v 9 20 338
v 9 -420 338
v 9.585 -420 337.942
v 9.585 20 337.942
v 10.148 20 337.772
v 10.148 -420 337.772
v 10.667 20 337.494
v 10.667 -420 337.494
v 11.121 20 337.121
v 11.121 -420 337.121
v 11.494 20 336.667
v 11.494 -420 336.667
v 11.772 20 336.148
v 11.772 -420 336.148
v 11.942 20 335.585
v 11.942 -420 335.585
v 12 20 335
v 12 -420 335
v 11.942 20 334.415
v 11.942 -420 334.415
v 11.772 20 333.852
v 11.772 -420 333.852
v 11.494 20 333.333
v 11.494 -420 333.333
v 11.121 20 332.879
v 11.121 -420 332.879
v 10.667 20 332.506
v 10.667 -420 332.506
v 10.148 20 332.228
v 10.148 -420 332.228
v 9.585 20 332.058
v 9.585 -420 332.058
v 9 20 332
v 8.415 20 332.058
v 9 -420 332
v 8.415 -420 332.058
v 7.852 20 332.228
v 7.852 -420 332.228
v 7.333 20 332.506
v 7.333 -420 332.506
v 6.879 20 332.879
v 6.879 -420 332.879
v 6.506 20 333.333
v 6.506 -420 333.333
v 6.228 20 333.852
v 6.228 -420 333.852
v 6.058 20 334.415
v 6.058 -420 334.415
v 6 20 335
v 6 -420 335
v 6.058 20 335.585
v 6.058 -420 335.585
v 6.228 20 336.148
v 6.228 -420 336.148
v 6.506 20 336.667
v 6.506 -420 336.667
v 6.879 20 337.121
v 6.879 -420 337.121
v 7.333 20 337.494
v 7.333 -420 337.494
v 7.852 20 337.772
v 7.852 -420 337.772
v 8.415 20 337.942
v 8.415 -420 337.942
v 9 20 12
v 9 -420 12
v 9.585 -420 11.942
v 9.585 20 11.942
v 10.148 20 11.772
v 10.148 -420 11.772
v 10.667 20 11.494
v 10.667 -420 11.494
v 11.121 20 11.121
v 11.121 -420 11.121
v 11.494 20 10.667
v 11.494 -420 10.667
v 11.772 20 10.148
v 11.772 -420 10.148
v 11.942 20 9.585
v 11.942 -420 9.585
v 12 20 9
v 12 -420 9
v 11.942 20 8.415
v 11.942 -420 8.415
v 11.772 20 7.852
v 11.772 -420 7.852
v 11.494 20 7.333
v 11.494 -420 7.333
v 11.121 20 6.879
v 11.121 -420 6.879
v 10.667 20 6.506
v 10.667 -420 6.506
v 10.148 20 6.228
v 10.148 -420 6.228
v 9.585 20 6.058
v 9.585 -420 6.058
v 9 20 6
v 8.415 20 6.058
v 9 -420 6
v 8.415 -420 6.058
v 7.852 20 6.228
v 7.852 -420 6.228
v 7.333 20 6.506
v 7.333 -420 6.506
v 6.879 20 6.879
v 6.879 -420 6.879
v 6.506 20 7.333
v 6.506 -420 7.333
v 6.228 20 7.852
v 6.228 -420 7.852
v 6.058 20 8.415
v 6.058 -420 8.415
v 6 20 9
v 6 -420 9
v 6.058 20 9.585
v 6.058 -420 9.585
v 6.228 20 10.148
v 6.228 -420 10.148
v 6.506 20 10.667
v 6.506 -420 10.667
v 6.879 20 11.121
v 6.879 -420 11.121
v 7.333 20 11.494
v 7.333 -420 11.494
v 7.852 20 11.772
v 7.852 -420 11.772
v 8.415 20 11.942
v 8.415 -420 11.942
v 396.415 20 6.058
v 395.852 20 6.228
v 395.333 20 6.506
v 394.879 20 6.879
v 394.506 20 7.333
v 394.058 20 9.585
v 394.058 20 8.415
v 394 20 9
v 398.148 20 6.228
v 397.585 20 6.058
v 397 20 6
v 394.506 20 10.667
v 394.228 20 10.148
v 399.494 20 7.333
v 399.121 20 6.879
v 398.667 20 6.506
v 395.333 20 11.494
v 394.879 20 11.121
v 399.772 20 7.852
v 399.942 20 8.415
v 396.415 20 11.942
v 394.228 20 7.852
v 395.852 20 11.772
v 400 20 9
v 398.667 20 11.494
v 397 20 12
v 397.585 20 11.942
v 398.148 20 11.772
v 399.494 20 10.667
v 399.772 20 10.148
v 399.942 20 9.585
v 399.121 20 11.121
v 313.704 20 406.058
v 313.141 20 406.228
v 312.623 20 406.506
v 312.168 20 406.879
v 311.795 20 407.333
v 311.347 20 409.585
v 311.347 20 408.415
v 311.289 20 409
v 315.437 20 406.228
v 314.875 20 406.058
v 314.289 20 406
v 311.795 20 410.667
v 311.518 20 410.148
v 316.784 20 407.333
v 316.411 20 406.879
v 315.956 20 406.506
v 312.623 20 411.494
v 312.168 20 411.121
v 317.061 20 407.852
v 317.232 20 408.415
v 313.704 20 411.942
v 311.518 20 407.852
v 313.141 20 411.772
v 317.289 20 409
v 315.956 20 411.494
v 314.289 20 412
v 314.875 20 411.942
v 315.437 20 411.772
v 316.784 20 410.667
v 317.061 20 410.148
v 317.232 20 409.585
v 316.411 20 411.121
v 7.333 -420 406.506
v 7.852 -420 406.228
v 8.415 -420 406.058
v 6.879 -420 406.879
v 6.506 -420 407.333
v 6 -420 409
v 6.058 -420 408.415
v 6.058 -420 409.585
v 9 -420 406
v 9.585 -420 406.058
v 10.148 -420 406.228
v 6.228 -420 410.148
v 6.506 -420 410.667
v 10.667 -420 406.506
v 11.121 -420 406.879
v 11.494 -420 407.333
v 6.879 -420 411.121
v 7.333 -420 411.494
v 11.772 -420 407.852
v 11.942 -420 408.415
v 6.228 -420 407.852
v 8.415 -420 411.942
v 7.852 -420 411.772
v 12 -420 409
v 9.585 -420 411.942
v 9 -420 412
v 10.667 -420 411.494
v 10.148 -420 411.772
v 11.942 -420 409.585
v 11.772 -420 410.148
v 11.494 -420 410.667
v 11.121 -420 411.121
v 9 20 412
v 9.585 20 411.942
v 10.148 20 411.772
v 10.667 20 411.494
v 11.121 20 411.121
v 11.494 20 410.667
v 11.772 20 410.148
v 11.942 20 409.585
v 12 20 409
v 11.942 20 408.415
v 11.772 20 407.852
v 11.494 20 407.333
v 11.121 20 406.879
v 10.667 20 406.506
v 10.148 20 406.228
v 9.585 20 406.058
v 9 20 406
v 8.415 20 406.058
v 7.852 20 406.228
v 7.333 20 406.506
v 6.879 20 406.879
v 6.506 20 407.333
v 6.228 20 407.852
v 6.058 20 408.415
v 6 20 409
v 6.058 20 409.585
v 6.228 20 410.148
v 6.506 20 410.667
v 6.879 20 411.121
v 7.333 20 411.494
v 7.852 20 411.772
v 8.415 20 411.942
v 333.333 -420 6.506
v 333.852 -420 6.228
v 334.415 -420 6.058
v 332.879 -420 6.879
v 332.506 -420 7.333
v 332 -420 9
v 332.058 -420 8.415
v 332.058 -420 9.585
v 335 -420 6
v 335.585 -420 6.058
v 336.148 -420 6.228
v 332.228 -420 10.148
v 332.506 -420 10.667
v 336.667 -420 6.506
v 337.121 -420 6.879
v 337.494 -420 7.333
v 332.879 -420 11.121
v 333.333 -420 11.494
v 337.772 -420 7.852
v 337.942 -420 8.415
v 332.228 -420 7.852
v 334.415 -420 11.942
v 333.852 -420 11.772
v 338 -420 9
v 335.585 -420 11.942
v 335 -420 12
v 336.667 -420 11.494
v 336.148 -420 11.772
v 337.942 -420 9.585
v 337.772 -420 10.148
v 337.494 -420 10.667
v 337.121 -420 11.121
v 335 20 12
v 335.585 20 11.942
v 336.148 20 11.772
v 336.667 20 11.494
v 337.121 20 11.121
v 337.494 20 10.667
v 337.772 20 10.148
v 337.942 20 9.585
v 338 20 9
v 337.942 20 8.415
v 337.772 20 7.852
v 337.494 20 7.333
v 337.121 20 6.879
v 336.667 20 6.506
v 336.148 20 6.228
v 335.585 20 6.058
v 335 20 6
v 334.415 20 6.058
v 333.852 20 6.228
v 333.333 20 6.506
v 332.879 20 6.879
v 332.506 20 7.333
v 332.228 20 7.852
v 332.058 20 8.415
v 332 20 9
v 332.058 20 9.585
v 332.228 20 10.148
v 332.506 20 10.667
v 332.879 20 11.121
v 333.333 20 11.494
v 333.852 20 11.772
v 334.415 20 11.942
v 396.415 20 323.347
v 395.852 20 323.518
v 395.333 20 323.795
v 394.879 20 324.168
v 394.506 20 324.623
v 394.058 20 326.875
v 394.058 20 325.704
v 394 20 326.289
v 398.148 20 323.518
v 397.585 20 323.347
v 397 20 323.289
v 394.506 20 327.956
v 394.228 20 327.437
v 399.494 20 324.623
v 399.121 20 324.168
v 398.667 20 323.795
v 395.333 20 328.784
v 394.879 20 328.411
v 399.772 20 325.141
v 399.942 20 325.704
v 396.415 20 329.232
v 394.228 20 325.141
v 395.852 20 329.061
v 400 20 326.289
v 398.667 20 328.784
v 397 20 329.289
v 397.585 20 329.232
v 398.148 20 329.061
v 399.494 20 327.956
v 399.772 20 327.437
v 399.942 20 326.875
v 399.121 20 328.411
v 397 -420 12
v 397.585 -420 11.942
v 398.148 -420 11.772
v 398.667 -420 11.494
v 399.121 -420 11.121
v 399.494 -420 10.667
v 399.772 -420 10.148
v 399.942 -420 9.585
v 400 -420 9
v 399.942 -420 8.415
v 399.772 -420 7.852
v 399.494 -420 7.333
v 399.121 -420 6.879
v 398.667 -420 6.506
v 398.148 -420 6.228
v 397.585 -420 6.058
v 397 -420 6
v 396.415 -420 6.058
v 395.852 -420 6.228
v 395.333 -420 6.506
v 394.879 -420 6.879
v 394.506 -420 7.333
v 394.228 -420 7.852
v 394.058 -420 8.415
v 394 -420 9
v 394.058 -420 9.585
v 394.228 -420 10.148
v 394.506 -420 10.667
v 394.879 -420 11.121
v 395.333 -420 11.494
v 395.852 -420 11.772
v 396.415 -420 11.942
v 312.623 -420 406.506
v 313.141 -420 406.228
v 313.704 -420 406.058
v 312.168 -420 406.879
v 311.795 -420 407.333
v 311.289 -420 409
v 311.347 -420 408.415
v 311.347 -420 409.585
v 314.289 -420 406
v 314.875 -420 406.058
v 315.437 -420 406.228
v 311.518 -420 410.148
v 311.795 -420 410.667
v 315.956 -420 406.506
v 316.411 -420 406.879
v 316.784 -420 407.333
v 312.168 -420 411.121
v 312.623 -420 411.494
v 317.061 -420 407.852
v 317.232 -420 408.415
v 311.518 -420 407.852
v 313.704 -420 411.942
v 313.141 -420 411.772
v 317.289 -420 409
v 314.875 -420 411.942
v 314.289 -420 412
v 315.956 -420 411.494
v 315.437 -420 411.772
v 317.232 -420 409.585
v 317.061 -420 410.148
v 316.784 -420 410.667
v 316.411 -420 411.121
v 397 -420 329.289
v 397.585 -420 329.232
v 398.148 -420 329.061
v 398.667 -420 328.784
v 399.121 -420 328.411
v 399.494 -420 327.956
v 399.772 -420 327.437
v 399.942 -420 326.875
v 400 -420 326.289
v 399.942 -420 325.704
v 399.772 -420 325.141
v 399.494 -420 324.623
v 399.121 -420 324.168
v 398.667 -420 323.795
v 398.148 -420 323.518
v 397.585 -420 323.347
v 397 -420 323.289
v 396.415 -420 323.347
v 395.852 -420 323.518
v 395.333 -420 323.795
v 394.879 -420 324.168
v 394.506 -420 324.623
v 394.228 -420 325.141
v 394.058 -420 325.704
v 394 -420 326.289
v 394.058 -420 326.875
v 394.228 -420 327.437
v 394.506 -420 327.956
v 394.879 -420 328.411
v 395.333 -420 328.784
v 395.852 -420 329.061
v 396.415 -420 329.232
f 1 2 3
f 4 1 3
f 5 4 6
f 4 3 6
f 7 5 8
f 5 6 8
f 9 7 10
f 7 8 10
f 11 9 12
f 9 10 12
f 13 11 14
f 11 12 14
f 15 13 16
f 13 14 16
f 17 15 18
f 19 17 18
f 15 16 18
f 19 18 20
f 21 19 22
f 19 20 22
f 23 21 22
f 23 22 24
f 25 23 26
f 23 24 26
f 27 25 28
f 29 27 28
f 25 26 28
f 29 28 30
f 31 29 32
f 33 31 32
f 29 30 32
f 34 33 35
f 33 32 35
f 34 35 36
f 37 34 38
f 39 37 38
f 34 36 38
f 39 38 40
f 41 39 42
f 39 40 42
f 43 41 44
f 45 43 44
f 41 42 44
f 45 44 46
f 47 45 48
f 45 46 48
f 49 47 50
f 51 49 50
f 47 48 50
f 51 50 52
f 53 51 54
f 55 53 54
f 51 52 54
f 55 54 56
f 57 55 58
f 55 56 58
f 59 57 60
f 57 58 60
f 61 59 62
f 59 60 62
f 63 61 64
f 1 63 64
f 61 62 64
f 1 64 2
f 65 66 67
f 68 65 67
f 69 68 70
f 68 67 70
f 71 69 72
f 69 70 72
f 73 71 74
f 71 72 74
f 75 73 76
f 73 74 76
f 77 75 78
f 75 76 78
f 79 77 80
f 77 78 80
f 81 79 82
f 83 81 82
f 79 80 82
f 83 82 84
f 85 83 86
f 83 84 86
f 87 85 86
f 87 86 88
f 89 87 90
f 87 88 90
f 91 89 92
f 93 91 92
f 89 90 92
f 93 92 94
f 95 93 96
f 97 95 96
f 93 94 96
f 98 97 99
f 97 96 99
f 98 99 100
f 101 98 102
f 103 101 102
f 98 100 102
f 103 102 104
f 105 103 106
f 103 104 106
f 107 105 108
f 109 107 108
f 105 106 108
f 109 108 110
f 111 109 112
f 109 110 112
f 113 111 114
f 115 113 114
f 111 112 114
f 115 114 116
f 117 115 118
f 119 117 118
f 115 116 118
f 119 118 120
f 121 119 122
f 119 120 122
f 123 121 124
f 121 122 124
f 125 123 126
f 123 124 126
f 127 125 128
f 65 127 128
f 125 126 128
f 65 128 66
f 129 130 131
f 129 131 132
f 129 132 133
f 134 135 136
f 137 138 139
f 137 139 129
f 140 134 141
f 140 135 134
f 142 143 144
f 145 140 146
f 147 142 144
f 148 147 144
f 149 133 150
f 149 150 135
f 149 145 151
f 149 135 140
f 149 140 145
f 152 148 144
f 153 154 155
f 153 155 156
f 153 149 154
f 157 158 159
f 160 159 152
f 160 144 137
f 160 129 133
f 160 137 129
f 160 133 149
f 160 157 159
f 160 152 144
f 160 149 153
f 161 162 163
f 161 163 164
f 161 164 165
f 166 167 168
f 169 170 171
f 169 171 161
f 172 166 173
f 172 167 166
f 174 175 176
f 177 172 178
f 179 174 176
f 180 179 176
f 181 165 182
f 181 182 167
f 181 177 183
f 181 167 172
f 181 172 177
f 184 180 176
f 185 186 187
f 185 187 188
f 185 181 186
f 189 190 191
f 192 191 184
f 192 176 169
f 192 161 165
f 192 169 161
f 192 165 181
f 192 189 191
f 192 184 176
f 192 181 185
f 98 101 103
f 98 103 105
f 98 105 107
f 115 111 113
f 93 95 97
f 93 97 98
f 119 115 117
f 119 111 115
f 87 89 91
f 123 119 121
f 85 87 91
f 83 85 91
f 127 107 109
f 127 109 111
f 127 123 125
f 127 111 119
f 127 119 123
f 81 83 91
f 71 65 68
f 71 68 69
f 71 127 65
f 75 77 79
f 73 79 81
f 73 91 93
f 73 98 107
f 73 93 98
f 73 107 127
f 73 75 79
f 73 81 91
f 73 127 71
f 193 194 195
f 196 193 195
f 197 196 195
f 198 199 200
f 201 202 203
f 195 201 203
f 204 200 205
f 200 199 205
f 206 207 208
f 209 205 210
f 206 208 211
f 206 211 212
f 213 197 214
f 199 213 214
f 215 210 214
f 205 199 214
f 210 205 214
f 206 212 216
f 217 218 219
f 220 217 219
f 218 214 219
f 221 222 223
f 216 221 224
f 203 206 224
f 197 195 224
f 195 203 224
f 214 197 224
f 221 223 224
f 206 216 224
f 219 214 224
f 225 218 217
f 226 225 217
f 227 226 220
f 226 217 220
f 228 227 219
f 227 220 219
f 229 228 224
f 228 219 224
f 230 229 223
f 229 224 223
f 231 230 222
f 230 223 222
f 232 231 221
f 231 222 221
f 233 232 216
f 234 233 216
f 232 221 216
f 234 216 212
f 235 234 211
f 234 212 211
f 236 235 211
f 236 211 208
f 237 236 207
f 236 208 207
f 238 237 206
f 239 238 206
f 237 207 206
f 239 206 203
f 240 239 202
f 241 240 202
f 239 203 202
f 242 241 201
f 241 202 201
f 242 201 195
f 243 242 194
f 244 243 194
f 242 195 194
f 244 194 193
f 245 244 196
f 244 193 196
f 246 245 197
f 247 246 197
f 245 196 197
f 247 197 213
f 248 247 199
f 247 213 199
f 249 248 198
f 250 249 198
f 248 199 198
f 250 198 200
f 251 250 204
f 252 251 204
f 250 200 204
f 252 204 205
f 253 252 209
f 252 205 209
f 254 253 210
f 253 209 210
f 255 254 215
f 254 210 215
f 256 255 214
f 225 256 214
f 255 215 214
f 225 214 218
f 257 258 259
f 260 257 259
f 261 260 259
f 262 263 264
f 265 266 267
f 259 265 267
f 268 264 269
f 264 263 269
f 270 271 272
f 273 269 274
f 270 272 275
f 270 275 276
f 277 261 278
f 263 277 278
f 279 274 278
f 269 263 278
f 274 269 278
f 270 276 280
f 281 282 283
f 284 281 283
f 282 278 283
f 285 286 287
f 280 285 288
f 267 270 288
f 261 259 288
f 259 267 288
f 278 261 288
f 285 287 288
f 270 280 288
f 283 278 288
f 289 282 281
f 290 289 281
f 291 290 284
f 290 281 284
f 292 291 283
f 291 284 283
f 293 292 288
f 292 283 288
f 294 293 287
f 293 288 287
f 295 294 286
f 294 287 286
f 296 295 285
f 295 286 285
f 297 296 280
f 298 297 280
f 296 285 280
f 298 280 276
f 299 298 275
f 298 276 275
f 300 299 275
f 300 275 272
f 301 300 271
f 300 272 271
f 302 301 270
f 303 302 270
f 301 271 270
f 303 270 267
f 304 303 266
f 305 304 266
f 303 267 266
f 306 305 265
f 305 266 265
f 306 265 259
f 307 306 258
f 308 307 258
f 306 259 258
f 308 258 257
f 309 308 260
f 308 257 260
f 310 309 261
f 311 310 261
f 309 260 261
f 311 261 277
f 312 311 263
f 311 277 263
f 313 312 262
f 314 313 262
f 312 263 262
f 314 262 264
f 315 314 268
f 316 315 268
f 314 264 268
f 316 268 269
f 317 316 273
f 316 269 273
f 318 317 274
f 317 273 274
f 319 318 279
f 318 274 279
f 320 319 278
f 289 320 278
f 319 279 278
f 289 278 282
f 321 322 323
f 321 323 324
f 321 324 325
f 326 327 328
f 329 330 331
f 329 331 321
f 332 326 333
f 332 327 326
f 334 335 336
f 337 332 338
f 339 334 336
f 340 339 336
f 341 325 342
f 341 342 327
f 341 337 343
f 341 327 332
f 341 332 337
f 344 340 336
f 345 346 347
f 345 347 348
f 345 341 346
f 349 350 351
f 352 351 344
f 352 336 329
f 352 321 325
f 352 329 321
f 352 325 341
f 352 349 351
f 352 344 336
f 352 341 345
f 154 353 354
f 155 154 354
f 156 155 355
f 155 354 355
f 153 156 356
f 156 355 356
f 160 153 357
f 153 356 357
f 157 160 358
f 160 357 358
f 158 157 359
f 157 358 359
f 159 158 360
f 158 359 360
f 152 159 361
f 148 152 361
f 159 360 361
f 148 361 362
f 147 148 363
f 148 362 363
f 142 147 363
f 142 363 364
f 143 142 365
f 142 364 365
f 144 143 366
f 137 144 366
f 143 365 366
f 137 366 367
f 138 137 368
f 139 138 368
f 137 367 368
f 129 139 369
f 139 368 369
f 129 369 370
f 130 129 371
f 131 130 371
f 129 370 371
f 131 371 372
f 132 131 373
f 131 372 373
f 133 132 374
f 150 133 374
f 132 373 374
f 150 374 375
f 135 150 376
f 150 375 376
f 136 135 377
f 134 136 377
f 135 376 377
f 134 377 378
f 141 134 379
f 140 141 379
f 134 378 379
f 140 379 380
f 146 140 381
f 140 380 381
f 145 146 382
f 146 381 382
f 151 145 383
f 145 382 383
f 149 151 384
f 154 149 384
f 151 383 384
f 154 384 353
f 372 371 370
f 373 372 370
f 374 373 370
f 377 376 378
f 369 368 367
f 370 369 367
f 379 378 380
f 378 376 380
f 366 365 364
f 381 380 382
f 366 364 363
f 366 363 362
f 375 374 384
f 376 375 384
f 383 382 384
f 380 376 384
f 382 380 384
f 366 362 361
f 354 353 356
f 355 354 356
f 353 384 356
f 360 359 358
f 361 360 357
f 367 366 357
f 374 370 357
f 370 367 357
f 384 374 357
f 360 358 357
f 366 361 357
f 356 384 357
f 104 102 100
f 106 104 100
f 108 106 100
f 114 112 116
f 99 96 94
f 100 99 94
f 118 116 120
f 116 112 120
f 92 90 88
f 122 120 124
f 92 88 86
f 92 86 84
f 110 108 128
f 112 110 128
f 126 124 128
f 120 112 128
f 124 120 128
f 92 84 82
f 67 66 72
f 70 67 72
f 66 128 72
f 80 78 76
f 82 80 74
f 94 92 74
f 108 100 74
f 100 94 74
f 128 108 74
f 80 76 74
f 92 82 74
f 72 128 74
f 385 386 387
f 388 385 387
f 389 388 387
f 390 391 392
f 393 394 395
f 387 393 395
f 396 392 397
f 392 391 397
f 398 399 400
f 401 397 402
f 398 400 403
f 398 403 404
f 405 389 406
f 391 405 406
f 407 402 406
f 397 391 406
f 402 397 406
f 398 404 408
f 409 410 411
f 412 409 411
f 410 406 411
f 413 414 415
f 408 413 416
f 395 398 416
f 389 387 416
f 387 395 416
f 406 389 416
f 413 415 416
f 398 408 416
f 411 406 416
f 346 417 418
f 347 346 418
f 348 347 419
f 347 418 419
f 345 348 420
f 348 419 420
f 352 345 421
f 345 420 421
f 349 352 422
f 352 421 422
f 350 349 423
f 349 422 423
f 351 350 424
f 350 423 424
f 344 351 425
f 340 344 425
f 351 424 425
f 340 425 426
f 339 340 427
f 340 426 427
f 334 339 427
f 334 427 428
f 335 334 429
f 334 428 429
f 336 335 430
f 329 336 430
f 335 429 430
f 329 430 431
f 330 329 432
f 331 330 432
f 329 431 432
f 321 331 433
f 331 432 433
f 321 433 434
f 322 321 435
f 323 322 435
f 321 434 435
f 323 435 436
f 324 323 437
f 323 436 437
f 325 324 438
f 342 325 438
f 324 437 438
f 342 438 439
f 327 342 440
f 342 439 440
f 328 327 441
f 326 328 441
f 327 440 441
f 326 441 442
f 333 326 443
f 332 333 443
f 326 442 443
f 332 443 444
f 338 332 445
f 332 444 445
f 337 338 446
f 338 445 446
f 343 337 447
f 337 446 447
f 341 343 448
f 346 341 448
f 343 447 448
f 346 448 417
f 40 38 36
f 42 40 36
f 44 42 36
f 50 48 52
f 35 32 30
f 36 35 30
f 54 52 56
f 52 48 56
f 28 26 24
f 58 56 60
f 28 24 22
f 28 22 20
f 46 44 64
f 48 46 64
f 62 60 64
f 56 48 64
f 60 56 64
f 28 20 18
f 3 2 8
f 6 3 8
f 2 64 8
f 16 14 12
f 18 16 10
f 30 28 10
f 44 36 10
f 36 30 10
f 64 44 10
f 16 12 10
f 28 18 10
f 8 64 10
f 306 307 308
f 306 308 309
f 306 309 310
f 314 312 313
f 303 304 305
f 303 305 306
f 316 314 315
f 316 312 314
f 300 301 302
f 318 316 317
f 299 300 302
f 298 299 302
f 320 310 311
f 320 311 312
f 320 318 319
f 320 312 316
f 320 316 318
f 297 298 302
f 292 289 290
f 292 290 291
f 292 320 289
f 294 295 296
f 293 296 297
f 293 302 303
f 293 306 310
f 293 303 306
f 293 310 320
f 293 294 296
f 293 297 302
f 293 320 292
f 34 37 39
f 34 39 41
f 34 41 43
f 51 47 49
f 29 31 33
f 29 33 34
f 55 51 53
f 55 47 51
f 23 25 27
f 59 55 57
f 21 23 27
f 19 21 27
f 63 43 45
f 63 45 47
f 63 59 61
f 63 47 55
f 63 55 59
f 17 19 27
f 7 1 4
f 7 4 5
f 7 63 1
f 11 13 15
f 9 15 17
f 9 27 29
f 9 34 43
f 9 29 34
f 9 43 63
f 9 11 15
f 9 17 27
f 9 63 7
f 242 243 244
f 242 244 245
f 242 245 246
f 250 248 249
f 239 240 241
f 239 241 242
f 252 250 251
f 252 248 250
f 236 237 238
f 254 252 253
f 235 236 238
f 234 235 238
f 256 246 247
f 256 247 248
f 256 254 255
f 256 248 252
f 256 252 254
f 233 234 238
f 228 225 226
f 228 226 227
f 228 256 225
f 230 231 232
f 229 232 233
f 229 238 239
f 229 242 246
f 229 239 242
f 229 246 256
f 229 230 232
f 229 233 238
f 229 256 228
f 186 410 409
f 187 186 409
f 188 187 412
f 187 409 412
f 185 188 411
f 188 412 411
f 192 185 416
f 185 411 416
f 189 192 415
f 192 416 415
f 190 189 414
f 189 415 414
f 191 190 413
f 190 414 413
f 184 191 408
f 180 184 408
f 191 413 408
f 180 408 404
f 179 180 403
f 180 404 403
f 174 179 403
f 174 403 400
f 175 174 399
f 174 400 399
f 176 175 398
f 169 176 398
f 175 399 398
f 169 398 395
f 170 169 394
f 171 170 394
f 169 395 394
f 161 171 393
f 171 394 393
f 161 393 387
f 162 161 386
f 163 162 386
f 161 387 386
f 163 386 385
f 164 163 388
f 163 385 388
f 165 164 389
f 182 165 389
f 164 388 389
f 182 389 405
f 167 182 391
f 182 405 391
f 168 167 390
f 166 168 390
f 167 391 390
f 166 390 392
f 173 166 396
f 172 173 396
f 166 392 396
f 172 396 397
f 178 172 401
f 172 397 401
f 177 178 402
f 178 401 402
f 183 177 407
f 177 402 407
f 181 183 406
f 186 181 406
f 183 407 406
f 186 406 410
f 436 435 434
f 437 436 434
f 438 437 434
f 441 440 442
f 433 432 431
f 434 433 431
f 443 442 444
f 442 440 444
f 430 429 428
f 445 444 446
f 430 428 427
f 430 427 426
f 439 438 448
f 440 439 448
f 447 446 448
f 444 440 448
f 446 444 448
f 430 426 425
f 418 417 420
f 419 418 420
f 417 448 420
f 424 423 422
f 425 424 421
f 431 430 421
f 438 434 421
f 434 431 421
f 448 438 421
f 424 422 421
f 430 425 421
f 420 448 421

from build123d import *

# Parameters (mm, degrees)
EXTRUDE_1_DEPTH        = 20
EXTRUDE_1_DEPTH_BACK   = 420
SKETCH_1_R             = 3
EXTRUDE_1_2_DEPTH      = 20
EXTRUDE_1_2_DEPTH_BACK = 420
EXTRUDE_1_3_DEPTH      = 20
EXTRUDE_1_3_DEPTH_BACK = 420
EXTRUDE_1_4_DEPTH      = 20
EXTRUDE_1_4_DEPTH_BACK = 420
EXTRUDE_1_5_DEPTH      = 20
EXTRUDE_1_5_DEPTH_BACK = 420
EXTRUDE_1_6_DEPTH      = 20
EXTRUDE_1_6_DEPTH_BACK = 420
EXTRUDE_1_7_DEPTH      = 20
EXTRUDE_1_7_DEPTH_BACK = 420


with BuildPart() as part:
    # Эскиз1 → Бобышка-Вытянуть1 (new, two sides: drawn at the far end of the back side and taken through both)
    with BuildSketch(Plane(origin=(0, 0, 0), x_dir=(1, 0, 0), z_dir=(0, 1, 0)).offset(-EXTRUDE_1_DEPTH_BACK)):
        with Locations(Location((335, -9, 0), (0, 0, 270))):
            Circle(SKETCH_1_R)
    extrude(amount=EXTRUDE_1_DEPTH + EXTRUDE_1_DEPTH_BACK)


with BuildPart() as body_2:
    # Эскиз1 → Extrude 1 2 (new, two sides: drawn at the far end of the back side and taken through both)
    with BuildSketch(Plane(origin=(0, 0, 0), x_dir=(1, 0, 0), z_dir=(0, 1, 0)).offset(-EXTRUDE_1_2_DEPTH_BACK)):
        with Locations(Location((9, -9, 0), (0, 0, 270))):
            Circle(SKETCH_1_R)
    extrude(amount=EXTRUDE_1_2_DEPTH + EXTRUDE_1_2_DEPTH_BACK)


with BuildPart() as body_3:
    # Эскиз1 → Extrude 1 3 (new, two sides: drawn at the far end of the back side and taken through both)
    with BuildSketch(Plane(origin=(0, 0, 0), x_dir=(1, 0, 0), z_dir=(0, 1, 0)).offset(-EXTRUDE_1_3_DEPTH_BACK)):
        with Locations(Location((9, -335, 0), (0, 0, 270))):
            Circle(SKETCH_1_R)
    extrude(amount=EXTRUDE_1_3_DEPTH + EXTRUDE_1_3_DEPTH_BACK)


with BuildPart() as body_4:
    # Эскиз1 → Extrude 1 4 (new, two sides: drawn at the far end of the back side and taken through both)
    with BuildSketch(Plane(origin=(0, 0, 0), x_dir=(1, 0, 0), z_dir=(0, 1, 0)).offset(-EXTRUDE_1_4_DEPTH_BACK)):
        with Locations(Location((314.289321881, -409, 0), (0, 0, 270))):
            Circle(SKETCH_1_R)
    extrude(amount=EXTRUDE_1_4_DEPTH + EXTRUDE_1_4_DEPTH_BACK)


with BuildPart() as body_5:
    # Эскиз1 → Extrude 1 5 (new, two sides: drawn at the far end of the back side and taken through both)
    with BuildSketch(Plane(origin=(0, 0, 0), x_dir=(1, 0, 0), z_dir=(0, 1, 0)).offset(-EXTRUDE_1_5_DEPTH_BACK)):
        with Locations(Location((397, -326.289321881, 0), (0, 0, 270))):
            Circle(SKETCH_1_R)
    extrude(amount=EXTRUDE_1_5_DEPTH + EXTRUDE_1_5_DEPTH_BACK)


with BuildPart() as body_6:
    # Эскиз1 → Extrude 1 6 (new, two sides: drawn at the far end of the back side and taken through both)
    with BuildSketch(Plane(origin=(0, 0, 0), x_dir=(1, 0, 0), z_dir=(0, 1, 0)).offset(-EXTRUDE_1_6_DEPTH_BACK)):
        with Locations(Location((9, -409, 0), (0, 0, 270))):
            Circle(SKETCH_1_R)
    extrude(amount=EXTRUDE_1_6_DEPTH + EXTRUDE_1_6_DEPTH_BACK)


with BuildPart() as body_7:
    # Эскиз1 → Extrude 1 7 (new, two sides: drawn at the far end of the back side and taken through both)
    with BuildSketch(Plane(origin=(0, 0, 0), x_dir=(1, 0, 0), z_dir=(0, 1, 0)).offset(-EXTRUDE_1_7_DEPTH_BACK)):
        with Locations(Location((397, -9, 0), (0, 0, 270))):
            Circle(SKETCH_1_R)
    extrude(amount=EXTRUDE_1_7_DEPTH + EXTRUDE_1_7_DEPTH_BACK)


solid = Compound([part.part, body_2.part, body_3.part, body_4.part, body_5.part, body_6.part, body_7.part])
